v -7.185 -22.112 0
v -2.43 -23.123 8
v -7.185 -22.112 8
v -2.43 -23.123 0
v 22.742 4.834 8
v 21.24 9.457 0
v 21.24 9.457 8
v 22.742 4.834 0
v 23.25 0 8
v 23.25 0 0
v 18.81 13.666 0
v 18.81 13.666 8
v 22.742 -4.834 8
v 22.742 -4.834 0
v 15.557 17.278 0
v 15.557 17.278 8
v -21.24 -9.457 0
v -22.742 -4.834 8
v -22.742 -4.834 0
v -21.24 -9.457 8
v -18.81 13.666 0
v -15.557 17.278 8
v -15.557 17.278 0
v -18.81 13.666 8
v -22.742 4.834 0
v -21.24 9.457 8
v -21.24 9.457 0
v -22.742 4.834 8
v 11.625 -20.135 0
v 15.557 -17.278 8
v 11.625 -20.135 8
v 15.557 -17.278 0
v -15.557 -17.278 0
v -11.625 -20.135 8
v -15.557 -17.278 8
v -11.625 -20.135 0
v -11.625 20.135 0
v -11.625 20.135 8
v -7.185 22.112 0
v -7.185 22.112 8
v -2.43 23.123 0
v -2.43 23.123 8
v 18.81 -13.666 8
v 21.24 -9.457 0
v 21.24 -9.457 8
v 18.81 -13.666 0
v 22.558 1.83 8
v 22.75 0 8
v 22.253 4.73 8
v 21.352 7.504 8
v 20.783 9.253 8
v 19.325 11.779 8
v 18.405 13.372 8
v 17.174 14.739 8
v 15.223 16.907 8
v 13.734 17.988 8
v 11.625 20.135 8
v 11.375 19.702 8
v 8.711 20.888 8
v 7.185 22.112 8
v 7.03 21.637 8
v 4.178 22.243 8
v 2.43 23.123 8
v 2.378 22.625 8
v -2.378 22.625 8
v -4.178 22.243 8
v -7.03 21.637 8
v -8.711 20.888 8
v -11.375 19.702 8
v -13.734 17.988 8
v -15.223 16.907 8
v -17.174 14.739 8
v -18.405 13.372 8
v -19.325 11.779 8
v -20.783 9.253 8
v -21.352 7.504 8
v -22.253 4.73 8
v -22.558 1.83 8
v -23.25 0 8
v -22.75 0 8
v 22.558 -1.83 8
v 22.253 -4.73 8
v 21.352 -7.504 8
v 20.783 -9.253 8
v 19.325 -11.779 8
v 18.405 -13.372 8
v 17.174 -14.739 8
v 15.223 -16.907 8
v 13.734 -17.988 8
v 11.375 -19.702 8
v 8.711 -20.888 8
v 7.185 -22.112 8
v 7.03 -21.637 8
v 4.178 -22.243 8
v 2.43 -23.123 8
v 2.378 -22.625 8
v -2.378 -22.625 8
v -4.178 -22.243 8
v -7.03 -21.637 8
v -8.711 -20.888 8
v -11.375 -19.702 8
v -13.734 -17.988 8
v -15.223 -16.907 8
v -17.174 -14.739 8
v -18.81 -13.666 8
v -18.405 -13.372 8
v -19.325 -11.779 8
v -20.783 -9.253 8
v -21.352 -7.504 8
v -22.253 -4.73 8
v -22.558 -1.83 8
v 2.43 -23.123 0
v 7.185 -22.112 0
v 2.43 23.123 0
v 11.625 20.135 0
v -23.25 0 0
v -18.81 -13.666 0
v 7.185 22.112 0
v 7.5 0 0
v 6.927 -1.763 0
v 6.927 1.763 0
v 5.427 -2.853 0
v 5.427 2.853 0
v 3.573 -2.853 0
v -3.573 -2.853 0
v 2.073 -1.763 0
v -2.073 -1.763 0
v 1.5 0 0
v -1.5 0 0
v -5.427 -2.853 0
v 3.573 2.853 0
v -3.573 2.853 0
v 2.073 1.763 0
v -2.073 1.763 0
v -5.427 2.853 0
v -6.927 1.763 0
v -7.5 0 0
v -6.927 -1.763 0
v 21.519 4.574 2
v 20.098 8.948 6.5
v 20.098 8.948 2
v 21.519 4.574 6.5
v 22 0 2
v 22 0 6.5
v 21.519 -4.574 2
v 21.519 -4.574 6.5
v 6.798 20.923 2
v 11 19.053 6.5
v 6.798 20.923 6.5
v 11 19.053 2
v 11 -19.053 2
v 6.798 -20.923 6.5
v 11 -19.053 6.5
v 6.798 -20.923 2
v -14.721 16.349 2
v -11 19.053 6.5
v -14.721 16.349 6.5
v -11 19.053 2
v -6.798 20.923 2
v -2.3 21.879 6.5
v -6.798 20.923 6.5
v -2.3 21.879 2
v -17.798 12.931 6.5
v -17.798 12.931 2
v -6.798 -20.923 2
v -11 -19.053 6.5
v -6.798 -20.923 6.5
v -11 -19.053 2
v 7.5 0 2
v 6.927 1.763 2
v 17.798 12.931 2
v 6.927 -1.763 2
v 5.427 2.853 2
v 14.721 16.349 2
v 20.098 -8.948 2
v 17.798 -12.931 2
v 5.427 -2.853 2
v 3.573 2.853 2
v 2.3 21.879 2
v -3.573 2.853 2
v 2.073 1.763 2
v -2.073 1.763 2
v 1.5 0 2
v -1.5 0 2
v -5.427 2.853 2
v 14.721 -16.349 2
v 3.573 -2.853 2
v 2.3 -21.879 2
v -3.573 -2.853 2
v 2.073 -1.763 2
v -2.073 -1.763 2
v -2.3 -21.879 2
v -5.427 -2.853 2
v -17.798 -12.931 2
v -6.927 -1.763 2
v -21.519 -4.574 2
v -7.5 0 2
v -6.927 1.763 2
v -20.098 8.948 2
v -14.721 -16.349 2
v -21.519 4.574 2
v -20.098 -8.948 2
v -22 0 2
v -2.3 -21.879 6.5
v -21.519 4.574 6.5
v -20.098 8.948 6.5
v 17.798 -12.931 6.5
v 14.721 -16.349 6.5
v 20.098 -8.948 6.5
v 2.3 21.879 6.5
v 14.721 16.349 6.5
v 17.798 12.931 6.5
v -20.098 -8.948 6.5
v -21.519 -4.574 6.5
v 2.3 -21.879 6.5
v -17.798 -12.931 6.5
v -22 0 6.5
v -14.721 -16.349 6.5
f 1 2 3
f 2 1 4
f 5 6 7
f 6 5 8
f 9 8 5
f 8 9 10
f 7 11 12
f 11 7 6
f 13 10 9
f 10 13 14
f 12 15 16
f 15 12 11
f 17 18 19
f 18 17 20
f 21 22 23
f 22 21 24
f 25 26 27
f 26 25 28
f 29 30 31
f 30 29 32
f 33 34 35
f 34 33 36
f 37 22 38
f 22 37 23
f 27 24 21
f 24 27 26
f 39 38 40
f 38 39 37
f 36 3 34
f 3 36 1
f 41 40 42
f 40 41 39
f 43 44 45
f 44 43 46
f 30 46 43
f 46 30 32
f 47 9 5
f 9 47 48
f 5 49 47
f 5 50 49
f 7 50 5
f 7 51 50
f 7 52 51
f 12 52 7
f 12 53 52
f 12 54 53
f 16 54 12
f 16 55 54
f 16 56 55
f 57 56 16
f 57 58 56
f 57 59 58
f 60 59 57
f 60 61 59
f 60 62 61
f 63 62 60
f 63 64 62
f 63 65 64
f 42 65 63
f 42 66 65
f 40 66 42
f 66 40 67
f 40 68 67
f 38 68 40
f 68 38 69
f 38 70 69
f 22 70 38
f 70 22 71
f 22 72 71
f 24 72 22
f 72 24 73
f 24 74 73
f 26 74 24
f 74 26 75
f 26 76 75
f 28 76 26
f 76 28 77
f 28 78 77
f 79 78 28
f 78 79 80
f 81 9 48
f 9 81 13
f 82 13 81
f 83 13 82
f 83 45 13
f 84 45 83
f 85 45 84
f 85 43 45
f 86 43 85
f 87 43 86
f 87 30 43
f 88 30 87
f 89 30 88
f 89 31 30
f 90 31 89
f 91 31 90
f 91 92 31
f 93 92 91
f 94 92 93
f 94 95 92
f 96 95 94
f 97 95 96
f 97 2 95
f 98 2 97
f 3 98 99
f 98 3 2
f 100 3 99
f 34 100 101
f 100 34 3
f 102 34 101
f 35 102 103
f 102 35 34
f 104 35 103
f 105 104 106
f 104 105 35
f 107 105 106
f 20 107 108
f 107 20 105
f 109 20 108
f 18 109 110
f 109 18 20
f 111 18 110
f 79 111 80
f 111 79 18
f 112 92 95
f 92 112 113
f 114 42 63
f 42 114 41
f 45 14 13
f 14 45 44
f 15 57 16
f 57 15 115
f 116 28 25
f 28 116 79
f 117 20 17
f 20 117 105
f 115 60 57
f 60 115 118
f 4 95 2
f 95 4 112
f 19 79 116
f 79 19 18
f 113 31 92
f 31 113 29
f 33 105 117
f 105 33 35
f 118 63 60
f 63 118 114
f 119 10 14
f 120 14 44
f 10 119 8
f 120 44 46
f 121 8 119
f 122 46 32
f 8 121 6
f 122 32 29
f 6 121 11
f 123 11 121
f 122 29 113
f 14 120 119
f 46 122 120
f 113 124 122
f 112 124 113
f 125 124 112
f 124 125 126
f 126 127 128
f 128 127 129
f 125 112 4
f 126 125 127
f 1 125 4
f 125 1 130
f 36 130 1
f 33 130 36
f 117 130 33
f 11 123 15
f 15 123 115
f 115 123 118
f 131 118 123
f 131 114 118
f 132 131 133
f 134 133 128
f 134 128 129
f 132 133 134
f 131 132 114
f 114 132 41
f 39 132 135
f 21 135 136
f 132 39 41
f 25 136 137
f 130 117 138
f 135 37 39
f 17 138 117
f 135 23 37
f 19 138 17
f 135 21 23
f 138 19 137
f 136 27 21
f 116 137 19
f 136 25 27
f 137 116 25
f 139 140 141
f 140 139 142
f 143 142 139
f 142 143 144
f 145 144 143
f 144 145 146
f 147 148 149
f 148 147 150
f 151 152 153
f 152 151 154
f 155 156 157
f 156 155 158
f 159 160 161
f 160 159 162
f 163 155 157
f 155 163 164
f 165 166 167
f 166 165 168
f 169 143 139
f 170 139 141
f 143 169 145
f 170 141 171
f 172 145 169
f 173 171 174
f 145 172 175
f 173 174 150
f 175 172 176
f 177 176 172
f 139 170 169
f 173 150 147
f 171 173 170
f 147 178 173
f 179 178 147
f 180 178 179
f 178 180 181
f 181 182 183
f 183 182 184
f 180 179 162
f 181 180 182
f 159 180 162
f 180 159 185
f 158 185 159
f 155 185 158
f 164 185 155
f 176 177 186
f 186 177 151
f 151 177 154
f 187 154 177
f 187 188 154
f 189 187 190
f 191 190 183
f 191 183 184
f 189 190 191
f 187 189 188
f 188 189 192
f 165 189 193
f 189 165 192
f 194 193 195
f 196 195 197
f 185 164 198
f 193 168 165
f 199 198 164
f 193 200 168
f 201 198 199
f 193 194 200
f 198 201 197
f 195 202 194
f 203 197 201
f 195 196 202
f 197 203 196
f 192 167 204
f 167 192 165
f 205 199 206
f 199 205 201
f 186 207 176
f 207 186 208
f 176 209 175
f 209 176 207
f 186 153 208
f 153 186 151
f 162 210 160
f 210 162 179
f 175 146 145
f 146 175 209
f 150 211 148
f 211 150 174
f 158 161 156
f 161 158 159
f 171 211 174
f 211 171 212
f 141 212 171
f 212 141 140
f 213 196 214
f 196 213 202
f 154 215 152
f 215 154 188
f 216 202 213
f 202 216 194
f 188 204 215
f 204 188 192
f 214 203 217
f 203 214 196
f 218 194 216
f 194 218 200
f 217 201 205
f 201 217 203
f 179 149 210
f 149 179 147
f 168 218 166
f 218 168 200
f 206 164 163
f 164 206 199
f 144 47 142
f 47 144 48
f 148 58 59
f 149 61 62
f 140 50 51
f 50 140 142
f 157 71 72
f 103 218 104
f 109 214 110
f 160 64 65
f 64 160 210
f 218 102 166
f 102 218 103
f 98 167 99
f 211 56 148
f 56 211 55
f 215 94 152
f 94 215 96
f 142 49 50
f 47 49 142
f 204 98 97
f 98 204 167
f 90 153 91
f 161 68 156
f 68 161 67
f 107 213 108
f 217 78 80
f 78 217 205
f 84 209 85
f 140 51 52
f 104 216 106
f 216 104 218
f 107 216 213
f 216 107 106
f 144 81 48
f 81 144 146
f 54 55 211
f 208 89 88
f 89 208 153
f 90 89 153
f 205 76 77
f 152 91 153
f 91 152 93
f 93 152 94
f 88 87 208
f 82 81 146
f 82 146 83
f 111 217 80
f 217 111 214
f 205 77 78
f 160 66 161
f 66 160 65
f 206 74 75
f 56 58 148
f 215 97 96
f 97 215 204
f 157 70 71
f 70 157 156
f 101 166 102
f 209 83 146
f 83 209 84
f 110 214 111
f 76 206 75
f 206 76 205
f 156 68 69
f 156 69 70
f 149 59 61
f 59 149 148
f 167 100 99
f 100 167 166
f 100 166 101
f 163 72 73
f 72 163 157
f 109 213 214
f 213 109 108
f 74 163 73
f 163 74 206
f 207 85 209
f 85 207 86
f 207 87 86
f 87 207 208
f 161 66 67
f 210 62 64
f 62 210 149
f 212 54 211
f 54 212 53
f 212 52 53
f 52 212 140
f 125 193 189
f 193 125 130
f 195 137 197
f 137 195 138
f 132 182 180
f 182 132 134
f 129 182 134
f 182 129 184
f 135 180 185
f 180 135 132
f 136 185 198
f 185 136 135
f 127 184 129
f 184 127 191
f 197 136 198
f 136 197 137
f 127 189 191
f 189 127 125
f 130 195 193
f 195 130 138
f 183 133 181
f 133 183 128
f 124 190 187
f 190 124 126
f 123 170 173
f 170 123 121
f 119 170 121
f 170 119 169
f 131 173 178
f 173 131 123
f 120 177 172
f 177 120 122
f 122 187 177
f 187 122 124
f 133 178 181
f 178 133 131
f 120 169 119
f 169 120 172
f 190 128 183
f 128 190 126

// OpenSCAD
//Taper Height - Set to 0 to disable taper
TAPER_HEIGHT=1.5;	

//Height of the cap
HEIGHT=8;

//Inside Diameter
ID=44;

//Outside Diameter
OD=46.5;

//Rubber Band Hole Diameter
HOLE_DIAMETER=3;

//Thickness of the endcap
BASE_THICKNESS=2;

difference() {
	cylinder(HEIGHT, d=OD, d=OD);
	translate([0,0,BASE_THICKNESS]) cylinder(HEIGHT, ID/2, ID/2);

	//Taper
	translate([0,0,HEIGHT - TAPER_HEIGHT]) cylinder(TAPER_HEIGHT + 1, ID/2, OD/2);

	//Band Holes
	translate([-1.5 * HOLE_DIAMETER,0,-.5]) cylinder(BASE_THICKNESS + 1, HOLE_DIAMETER, HOLE_DIAMETER);
	translate([1.5 * HOLE_DIAMETER,0,-.5]) cylinder(BASE_THICKNESS + 1, HOLE_DIAMETER, HOLE_DIAMETER);

}
